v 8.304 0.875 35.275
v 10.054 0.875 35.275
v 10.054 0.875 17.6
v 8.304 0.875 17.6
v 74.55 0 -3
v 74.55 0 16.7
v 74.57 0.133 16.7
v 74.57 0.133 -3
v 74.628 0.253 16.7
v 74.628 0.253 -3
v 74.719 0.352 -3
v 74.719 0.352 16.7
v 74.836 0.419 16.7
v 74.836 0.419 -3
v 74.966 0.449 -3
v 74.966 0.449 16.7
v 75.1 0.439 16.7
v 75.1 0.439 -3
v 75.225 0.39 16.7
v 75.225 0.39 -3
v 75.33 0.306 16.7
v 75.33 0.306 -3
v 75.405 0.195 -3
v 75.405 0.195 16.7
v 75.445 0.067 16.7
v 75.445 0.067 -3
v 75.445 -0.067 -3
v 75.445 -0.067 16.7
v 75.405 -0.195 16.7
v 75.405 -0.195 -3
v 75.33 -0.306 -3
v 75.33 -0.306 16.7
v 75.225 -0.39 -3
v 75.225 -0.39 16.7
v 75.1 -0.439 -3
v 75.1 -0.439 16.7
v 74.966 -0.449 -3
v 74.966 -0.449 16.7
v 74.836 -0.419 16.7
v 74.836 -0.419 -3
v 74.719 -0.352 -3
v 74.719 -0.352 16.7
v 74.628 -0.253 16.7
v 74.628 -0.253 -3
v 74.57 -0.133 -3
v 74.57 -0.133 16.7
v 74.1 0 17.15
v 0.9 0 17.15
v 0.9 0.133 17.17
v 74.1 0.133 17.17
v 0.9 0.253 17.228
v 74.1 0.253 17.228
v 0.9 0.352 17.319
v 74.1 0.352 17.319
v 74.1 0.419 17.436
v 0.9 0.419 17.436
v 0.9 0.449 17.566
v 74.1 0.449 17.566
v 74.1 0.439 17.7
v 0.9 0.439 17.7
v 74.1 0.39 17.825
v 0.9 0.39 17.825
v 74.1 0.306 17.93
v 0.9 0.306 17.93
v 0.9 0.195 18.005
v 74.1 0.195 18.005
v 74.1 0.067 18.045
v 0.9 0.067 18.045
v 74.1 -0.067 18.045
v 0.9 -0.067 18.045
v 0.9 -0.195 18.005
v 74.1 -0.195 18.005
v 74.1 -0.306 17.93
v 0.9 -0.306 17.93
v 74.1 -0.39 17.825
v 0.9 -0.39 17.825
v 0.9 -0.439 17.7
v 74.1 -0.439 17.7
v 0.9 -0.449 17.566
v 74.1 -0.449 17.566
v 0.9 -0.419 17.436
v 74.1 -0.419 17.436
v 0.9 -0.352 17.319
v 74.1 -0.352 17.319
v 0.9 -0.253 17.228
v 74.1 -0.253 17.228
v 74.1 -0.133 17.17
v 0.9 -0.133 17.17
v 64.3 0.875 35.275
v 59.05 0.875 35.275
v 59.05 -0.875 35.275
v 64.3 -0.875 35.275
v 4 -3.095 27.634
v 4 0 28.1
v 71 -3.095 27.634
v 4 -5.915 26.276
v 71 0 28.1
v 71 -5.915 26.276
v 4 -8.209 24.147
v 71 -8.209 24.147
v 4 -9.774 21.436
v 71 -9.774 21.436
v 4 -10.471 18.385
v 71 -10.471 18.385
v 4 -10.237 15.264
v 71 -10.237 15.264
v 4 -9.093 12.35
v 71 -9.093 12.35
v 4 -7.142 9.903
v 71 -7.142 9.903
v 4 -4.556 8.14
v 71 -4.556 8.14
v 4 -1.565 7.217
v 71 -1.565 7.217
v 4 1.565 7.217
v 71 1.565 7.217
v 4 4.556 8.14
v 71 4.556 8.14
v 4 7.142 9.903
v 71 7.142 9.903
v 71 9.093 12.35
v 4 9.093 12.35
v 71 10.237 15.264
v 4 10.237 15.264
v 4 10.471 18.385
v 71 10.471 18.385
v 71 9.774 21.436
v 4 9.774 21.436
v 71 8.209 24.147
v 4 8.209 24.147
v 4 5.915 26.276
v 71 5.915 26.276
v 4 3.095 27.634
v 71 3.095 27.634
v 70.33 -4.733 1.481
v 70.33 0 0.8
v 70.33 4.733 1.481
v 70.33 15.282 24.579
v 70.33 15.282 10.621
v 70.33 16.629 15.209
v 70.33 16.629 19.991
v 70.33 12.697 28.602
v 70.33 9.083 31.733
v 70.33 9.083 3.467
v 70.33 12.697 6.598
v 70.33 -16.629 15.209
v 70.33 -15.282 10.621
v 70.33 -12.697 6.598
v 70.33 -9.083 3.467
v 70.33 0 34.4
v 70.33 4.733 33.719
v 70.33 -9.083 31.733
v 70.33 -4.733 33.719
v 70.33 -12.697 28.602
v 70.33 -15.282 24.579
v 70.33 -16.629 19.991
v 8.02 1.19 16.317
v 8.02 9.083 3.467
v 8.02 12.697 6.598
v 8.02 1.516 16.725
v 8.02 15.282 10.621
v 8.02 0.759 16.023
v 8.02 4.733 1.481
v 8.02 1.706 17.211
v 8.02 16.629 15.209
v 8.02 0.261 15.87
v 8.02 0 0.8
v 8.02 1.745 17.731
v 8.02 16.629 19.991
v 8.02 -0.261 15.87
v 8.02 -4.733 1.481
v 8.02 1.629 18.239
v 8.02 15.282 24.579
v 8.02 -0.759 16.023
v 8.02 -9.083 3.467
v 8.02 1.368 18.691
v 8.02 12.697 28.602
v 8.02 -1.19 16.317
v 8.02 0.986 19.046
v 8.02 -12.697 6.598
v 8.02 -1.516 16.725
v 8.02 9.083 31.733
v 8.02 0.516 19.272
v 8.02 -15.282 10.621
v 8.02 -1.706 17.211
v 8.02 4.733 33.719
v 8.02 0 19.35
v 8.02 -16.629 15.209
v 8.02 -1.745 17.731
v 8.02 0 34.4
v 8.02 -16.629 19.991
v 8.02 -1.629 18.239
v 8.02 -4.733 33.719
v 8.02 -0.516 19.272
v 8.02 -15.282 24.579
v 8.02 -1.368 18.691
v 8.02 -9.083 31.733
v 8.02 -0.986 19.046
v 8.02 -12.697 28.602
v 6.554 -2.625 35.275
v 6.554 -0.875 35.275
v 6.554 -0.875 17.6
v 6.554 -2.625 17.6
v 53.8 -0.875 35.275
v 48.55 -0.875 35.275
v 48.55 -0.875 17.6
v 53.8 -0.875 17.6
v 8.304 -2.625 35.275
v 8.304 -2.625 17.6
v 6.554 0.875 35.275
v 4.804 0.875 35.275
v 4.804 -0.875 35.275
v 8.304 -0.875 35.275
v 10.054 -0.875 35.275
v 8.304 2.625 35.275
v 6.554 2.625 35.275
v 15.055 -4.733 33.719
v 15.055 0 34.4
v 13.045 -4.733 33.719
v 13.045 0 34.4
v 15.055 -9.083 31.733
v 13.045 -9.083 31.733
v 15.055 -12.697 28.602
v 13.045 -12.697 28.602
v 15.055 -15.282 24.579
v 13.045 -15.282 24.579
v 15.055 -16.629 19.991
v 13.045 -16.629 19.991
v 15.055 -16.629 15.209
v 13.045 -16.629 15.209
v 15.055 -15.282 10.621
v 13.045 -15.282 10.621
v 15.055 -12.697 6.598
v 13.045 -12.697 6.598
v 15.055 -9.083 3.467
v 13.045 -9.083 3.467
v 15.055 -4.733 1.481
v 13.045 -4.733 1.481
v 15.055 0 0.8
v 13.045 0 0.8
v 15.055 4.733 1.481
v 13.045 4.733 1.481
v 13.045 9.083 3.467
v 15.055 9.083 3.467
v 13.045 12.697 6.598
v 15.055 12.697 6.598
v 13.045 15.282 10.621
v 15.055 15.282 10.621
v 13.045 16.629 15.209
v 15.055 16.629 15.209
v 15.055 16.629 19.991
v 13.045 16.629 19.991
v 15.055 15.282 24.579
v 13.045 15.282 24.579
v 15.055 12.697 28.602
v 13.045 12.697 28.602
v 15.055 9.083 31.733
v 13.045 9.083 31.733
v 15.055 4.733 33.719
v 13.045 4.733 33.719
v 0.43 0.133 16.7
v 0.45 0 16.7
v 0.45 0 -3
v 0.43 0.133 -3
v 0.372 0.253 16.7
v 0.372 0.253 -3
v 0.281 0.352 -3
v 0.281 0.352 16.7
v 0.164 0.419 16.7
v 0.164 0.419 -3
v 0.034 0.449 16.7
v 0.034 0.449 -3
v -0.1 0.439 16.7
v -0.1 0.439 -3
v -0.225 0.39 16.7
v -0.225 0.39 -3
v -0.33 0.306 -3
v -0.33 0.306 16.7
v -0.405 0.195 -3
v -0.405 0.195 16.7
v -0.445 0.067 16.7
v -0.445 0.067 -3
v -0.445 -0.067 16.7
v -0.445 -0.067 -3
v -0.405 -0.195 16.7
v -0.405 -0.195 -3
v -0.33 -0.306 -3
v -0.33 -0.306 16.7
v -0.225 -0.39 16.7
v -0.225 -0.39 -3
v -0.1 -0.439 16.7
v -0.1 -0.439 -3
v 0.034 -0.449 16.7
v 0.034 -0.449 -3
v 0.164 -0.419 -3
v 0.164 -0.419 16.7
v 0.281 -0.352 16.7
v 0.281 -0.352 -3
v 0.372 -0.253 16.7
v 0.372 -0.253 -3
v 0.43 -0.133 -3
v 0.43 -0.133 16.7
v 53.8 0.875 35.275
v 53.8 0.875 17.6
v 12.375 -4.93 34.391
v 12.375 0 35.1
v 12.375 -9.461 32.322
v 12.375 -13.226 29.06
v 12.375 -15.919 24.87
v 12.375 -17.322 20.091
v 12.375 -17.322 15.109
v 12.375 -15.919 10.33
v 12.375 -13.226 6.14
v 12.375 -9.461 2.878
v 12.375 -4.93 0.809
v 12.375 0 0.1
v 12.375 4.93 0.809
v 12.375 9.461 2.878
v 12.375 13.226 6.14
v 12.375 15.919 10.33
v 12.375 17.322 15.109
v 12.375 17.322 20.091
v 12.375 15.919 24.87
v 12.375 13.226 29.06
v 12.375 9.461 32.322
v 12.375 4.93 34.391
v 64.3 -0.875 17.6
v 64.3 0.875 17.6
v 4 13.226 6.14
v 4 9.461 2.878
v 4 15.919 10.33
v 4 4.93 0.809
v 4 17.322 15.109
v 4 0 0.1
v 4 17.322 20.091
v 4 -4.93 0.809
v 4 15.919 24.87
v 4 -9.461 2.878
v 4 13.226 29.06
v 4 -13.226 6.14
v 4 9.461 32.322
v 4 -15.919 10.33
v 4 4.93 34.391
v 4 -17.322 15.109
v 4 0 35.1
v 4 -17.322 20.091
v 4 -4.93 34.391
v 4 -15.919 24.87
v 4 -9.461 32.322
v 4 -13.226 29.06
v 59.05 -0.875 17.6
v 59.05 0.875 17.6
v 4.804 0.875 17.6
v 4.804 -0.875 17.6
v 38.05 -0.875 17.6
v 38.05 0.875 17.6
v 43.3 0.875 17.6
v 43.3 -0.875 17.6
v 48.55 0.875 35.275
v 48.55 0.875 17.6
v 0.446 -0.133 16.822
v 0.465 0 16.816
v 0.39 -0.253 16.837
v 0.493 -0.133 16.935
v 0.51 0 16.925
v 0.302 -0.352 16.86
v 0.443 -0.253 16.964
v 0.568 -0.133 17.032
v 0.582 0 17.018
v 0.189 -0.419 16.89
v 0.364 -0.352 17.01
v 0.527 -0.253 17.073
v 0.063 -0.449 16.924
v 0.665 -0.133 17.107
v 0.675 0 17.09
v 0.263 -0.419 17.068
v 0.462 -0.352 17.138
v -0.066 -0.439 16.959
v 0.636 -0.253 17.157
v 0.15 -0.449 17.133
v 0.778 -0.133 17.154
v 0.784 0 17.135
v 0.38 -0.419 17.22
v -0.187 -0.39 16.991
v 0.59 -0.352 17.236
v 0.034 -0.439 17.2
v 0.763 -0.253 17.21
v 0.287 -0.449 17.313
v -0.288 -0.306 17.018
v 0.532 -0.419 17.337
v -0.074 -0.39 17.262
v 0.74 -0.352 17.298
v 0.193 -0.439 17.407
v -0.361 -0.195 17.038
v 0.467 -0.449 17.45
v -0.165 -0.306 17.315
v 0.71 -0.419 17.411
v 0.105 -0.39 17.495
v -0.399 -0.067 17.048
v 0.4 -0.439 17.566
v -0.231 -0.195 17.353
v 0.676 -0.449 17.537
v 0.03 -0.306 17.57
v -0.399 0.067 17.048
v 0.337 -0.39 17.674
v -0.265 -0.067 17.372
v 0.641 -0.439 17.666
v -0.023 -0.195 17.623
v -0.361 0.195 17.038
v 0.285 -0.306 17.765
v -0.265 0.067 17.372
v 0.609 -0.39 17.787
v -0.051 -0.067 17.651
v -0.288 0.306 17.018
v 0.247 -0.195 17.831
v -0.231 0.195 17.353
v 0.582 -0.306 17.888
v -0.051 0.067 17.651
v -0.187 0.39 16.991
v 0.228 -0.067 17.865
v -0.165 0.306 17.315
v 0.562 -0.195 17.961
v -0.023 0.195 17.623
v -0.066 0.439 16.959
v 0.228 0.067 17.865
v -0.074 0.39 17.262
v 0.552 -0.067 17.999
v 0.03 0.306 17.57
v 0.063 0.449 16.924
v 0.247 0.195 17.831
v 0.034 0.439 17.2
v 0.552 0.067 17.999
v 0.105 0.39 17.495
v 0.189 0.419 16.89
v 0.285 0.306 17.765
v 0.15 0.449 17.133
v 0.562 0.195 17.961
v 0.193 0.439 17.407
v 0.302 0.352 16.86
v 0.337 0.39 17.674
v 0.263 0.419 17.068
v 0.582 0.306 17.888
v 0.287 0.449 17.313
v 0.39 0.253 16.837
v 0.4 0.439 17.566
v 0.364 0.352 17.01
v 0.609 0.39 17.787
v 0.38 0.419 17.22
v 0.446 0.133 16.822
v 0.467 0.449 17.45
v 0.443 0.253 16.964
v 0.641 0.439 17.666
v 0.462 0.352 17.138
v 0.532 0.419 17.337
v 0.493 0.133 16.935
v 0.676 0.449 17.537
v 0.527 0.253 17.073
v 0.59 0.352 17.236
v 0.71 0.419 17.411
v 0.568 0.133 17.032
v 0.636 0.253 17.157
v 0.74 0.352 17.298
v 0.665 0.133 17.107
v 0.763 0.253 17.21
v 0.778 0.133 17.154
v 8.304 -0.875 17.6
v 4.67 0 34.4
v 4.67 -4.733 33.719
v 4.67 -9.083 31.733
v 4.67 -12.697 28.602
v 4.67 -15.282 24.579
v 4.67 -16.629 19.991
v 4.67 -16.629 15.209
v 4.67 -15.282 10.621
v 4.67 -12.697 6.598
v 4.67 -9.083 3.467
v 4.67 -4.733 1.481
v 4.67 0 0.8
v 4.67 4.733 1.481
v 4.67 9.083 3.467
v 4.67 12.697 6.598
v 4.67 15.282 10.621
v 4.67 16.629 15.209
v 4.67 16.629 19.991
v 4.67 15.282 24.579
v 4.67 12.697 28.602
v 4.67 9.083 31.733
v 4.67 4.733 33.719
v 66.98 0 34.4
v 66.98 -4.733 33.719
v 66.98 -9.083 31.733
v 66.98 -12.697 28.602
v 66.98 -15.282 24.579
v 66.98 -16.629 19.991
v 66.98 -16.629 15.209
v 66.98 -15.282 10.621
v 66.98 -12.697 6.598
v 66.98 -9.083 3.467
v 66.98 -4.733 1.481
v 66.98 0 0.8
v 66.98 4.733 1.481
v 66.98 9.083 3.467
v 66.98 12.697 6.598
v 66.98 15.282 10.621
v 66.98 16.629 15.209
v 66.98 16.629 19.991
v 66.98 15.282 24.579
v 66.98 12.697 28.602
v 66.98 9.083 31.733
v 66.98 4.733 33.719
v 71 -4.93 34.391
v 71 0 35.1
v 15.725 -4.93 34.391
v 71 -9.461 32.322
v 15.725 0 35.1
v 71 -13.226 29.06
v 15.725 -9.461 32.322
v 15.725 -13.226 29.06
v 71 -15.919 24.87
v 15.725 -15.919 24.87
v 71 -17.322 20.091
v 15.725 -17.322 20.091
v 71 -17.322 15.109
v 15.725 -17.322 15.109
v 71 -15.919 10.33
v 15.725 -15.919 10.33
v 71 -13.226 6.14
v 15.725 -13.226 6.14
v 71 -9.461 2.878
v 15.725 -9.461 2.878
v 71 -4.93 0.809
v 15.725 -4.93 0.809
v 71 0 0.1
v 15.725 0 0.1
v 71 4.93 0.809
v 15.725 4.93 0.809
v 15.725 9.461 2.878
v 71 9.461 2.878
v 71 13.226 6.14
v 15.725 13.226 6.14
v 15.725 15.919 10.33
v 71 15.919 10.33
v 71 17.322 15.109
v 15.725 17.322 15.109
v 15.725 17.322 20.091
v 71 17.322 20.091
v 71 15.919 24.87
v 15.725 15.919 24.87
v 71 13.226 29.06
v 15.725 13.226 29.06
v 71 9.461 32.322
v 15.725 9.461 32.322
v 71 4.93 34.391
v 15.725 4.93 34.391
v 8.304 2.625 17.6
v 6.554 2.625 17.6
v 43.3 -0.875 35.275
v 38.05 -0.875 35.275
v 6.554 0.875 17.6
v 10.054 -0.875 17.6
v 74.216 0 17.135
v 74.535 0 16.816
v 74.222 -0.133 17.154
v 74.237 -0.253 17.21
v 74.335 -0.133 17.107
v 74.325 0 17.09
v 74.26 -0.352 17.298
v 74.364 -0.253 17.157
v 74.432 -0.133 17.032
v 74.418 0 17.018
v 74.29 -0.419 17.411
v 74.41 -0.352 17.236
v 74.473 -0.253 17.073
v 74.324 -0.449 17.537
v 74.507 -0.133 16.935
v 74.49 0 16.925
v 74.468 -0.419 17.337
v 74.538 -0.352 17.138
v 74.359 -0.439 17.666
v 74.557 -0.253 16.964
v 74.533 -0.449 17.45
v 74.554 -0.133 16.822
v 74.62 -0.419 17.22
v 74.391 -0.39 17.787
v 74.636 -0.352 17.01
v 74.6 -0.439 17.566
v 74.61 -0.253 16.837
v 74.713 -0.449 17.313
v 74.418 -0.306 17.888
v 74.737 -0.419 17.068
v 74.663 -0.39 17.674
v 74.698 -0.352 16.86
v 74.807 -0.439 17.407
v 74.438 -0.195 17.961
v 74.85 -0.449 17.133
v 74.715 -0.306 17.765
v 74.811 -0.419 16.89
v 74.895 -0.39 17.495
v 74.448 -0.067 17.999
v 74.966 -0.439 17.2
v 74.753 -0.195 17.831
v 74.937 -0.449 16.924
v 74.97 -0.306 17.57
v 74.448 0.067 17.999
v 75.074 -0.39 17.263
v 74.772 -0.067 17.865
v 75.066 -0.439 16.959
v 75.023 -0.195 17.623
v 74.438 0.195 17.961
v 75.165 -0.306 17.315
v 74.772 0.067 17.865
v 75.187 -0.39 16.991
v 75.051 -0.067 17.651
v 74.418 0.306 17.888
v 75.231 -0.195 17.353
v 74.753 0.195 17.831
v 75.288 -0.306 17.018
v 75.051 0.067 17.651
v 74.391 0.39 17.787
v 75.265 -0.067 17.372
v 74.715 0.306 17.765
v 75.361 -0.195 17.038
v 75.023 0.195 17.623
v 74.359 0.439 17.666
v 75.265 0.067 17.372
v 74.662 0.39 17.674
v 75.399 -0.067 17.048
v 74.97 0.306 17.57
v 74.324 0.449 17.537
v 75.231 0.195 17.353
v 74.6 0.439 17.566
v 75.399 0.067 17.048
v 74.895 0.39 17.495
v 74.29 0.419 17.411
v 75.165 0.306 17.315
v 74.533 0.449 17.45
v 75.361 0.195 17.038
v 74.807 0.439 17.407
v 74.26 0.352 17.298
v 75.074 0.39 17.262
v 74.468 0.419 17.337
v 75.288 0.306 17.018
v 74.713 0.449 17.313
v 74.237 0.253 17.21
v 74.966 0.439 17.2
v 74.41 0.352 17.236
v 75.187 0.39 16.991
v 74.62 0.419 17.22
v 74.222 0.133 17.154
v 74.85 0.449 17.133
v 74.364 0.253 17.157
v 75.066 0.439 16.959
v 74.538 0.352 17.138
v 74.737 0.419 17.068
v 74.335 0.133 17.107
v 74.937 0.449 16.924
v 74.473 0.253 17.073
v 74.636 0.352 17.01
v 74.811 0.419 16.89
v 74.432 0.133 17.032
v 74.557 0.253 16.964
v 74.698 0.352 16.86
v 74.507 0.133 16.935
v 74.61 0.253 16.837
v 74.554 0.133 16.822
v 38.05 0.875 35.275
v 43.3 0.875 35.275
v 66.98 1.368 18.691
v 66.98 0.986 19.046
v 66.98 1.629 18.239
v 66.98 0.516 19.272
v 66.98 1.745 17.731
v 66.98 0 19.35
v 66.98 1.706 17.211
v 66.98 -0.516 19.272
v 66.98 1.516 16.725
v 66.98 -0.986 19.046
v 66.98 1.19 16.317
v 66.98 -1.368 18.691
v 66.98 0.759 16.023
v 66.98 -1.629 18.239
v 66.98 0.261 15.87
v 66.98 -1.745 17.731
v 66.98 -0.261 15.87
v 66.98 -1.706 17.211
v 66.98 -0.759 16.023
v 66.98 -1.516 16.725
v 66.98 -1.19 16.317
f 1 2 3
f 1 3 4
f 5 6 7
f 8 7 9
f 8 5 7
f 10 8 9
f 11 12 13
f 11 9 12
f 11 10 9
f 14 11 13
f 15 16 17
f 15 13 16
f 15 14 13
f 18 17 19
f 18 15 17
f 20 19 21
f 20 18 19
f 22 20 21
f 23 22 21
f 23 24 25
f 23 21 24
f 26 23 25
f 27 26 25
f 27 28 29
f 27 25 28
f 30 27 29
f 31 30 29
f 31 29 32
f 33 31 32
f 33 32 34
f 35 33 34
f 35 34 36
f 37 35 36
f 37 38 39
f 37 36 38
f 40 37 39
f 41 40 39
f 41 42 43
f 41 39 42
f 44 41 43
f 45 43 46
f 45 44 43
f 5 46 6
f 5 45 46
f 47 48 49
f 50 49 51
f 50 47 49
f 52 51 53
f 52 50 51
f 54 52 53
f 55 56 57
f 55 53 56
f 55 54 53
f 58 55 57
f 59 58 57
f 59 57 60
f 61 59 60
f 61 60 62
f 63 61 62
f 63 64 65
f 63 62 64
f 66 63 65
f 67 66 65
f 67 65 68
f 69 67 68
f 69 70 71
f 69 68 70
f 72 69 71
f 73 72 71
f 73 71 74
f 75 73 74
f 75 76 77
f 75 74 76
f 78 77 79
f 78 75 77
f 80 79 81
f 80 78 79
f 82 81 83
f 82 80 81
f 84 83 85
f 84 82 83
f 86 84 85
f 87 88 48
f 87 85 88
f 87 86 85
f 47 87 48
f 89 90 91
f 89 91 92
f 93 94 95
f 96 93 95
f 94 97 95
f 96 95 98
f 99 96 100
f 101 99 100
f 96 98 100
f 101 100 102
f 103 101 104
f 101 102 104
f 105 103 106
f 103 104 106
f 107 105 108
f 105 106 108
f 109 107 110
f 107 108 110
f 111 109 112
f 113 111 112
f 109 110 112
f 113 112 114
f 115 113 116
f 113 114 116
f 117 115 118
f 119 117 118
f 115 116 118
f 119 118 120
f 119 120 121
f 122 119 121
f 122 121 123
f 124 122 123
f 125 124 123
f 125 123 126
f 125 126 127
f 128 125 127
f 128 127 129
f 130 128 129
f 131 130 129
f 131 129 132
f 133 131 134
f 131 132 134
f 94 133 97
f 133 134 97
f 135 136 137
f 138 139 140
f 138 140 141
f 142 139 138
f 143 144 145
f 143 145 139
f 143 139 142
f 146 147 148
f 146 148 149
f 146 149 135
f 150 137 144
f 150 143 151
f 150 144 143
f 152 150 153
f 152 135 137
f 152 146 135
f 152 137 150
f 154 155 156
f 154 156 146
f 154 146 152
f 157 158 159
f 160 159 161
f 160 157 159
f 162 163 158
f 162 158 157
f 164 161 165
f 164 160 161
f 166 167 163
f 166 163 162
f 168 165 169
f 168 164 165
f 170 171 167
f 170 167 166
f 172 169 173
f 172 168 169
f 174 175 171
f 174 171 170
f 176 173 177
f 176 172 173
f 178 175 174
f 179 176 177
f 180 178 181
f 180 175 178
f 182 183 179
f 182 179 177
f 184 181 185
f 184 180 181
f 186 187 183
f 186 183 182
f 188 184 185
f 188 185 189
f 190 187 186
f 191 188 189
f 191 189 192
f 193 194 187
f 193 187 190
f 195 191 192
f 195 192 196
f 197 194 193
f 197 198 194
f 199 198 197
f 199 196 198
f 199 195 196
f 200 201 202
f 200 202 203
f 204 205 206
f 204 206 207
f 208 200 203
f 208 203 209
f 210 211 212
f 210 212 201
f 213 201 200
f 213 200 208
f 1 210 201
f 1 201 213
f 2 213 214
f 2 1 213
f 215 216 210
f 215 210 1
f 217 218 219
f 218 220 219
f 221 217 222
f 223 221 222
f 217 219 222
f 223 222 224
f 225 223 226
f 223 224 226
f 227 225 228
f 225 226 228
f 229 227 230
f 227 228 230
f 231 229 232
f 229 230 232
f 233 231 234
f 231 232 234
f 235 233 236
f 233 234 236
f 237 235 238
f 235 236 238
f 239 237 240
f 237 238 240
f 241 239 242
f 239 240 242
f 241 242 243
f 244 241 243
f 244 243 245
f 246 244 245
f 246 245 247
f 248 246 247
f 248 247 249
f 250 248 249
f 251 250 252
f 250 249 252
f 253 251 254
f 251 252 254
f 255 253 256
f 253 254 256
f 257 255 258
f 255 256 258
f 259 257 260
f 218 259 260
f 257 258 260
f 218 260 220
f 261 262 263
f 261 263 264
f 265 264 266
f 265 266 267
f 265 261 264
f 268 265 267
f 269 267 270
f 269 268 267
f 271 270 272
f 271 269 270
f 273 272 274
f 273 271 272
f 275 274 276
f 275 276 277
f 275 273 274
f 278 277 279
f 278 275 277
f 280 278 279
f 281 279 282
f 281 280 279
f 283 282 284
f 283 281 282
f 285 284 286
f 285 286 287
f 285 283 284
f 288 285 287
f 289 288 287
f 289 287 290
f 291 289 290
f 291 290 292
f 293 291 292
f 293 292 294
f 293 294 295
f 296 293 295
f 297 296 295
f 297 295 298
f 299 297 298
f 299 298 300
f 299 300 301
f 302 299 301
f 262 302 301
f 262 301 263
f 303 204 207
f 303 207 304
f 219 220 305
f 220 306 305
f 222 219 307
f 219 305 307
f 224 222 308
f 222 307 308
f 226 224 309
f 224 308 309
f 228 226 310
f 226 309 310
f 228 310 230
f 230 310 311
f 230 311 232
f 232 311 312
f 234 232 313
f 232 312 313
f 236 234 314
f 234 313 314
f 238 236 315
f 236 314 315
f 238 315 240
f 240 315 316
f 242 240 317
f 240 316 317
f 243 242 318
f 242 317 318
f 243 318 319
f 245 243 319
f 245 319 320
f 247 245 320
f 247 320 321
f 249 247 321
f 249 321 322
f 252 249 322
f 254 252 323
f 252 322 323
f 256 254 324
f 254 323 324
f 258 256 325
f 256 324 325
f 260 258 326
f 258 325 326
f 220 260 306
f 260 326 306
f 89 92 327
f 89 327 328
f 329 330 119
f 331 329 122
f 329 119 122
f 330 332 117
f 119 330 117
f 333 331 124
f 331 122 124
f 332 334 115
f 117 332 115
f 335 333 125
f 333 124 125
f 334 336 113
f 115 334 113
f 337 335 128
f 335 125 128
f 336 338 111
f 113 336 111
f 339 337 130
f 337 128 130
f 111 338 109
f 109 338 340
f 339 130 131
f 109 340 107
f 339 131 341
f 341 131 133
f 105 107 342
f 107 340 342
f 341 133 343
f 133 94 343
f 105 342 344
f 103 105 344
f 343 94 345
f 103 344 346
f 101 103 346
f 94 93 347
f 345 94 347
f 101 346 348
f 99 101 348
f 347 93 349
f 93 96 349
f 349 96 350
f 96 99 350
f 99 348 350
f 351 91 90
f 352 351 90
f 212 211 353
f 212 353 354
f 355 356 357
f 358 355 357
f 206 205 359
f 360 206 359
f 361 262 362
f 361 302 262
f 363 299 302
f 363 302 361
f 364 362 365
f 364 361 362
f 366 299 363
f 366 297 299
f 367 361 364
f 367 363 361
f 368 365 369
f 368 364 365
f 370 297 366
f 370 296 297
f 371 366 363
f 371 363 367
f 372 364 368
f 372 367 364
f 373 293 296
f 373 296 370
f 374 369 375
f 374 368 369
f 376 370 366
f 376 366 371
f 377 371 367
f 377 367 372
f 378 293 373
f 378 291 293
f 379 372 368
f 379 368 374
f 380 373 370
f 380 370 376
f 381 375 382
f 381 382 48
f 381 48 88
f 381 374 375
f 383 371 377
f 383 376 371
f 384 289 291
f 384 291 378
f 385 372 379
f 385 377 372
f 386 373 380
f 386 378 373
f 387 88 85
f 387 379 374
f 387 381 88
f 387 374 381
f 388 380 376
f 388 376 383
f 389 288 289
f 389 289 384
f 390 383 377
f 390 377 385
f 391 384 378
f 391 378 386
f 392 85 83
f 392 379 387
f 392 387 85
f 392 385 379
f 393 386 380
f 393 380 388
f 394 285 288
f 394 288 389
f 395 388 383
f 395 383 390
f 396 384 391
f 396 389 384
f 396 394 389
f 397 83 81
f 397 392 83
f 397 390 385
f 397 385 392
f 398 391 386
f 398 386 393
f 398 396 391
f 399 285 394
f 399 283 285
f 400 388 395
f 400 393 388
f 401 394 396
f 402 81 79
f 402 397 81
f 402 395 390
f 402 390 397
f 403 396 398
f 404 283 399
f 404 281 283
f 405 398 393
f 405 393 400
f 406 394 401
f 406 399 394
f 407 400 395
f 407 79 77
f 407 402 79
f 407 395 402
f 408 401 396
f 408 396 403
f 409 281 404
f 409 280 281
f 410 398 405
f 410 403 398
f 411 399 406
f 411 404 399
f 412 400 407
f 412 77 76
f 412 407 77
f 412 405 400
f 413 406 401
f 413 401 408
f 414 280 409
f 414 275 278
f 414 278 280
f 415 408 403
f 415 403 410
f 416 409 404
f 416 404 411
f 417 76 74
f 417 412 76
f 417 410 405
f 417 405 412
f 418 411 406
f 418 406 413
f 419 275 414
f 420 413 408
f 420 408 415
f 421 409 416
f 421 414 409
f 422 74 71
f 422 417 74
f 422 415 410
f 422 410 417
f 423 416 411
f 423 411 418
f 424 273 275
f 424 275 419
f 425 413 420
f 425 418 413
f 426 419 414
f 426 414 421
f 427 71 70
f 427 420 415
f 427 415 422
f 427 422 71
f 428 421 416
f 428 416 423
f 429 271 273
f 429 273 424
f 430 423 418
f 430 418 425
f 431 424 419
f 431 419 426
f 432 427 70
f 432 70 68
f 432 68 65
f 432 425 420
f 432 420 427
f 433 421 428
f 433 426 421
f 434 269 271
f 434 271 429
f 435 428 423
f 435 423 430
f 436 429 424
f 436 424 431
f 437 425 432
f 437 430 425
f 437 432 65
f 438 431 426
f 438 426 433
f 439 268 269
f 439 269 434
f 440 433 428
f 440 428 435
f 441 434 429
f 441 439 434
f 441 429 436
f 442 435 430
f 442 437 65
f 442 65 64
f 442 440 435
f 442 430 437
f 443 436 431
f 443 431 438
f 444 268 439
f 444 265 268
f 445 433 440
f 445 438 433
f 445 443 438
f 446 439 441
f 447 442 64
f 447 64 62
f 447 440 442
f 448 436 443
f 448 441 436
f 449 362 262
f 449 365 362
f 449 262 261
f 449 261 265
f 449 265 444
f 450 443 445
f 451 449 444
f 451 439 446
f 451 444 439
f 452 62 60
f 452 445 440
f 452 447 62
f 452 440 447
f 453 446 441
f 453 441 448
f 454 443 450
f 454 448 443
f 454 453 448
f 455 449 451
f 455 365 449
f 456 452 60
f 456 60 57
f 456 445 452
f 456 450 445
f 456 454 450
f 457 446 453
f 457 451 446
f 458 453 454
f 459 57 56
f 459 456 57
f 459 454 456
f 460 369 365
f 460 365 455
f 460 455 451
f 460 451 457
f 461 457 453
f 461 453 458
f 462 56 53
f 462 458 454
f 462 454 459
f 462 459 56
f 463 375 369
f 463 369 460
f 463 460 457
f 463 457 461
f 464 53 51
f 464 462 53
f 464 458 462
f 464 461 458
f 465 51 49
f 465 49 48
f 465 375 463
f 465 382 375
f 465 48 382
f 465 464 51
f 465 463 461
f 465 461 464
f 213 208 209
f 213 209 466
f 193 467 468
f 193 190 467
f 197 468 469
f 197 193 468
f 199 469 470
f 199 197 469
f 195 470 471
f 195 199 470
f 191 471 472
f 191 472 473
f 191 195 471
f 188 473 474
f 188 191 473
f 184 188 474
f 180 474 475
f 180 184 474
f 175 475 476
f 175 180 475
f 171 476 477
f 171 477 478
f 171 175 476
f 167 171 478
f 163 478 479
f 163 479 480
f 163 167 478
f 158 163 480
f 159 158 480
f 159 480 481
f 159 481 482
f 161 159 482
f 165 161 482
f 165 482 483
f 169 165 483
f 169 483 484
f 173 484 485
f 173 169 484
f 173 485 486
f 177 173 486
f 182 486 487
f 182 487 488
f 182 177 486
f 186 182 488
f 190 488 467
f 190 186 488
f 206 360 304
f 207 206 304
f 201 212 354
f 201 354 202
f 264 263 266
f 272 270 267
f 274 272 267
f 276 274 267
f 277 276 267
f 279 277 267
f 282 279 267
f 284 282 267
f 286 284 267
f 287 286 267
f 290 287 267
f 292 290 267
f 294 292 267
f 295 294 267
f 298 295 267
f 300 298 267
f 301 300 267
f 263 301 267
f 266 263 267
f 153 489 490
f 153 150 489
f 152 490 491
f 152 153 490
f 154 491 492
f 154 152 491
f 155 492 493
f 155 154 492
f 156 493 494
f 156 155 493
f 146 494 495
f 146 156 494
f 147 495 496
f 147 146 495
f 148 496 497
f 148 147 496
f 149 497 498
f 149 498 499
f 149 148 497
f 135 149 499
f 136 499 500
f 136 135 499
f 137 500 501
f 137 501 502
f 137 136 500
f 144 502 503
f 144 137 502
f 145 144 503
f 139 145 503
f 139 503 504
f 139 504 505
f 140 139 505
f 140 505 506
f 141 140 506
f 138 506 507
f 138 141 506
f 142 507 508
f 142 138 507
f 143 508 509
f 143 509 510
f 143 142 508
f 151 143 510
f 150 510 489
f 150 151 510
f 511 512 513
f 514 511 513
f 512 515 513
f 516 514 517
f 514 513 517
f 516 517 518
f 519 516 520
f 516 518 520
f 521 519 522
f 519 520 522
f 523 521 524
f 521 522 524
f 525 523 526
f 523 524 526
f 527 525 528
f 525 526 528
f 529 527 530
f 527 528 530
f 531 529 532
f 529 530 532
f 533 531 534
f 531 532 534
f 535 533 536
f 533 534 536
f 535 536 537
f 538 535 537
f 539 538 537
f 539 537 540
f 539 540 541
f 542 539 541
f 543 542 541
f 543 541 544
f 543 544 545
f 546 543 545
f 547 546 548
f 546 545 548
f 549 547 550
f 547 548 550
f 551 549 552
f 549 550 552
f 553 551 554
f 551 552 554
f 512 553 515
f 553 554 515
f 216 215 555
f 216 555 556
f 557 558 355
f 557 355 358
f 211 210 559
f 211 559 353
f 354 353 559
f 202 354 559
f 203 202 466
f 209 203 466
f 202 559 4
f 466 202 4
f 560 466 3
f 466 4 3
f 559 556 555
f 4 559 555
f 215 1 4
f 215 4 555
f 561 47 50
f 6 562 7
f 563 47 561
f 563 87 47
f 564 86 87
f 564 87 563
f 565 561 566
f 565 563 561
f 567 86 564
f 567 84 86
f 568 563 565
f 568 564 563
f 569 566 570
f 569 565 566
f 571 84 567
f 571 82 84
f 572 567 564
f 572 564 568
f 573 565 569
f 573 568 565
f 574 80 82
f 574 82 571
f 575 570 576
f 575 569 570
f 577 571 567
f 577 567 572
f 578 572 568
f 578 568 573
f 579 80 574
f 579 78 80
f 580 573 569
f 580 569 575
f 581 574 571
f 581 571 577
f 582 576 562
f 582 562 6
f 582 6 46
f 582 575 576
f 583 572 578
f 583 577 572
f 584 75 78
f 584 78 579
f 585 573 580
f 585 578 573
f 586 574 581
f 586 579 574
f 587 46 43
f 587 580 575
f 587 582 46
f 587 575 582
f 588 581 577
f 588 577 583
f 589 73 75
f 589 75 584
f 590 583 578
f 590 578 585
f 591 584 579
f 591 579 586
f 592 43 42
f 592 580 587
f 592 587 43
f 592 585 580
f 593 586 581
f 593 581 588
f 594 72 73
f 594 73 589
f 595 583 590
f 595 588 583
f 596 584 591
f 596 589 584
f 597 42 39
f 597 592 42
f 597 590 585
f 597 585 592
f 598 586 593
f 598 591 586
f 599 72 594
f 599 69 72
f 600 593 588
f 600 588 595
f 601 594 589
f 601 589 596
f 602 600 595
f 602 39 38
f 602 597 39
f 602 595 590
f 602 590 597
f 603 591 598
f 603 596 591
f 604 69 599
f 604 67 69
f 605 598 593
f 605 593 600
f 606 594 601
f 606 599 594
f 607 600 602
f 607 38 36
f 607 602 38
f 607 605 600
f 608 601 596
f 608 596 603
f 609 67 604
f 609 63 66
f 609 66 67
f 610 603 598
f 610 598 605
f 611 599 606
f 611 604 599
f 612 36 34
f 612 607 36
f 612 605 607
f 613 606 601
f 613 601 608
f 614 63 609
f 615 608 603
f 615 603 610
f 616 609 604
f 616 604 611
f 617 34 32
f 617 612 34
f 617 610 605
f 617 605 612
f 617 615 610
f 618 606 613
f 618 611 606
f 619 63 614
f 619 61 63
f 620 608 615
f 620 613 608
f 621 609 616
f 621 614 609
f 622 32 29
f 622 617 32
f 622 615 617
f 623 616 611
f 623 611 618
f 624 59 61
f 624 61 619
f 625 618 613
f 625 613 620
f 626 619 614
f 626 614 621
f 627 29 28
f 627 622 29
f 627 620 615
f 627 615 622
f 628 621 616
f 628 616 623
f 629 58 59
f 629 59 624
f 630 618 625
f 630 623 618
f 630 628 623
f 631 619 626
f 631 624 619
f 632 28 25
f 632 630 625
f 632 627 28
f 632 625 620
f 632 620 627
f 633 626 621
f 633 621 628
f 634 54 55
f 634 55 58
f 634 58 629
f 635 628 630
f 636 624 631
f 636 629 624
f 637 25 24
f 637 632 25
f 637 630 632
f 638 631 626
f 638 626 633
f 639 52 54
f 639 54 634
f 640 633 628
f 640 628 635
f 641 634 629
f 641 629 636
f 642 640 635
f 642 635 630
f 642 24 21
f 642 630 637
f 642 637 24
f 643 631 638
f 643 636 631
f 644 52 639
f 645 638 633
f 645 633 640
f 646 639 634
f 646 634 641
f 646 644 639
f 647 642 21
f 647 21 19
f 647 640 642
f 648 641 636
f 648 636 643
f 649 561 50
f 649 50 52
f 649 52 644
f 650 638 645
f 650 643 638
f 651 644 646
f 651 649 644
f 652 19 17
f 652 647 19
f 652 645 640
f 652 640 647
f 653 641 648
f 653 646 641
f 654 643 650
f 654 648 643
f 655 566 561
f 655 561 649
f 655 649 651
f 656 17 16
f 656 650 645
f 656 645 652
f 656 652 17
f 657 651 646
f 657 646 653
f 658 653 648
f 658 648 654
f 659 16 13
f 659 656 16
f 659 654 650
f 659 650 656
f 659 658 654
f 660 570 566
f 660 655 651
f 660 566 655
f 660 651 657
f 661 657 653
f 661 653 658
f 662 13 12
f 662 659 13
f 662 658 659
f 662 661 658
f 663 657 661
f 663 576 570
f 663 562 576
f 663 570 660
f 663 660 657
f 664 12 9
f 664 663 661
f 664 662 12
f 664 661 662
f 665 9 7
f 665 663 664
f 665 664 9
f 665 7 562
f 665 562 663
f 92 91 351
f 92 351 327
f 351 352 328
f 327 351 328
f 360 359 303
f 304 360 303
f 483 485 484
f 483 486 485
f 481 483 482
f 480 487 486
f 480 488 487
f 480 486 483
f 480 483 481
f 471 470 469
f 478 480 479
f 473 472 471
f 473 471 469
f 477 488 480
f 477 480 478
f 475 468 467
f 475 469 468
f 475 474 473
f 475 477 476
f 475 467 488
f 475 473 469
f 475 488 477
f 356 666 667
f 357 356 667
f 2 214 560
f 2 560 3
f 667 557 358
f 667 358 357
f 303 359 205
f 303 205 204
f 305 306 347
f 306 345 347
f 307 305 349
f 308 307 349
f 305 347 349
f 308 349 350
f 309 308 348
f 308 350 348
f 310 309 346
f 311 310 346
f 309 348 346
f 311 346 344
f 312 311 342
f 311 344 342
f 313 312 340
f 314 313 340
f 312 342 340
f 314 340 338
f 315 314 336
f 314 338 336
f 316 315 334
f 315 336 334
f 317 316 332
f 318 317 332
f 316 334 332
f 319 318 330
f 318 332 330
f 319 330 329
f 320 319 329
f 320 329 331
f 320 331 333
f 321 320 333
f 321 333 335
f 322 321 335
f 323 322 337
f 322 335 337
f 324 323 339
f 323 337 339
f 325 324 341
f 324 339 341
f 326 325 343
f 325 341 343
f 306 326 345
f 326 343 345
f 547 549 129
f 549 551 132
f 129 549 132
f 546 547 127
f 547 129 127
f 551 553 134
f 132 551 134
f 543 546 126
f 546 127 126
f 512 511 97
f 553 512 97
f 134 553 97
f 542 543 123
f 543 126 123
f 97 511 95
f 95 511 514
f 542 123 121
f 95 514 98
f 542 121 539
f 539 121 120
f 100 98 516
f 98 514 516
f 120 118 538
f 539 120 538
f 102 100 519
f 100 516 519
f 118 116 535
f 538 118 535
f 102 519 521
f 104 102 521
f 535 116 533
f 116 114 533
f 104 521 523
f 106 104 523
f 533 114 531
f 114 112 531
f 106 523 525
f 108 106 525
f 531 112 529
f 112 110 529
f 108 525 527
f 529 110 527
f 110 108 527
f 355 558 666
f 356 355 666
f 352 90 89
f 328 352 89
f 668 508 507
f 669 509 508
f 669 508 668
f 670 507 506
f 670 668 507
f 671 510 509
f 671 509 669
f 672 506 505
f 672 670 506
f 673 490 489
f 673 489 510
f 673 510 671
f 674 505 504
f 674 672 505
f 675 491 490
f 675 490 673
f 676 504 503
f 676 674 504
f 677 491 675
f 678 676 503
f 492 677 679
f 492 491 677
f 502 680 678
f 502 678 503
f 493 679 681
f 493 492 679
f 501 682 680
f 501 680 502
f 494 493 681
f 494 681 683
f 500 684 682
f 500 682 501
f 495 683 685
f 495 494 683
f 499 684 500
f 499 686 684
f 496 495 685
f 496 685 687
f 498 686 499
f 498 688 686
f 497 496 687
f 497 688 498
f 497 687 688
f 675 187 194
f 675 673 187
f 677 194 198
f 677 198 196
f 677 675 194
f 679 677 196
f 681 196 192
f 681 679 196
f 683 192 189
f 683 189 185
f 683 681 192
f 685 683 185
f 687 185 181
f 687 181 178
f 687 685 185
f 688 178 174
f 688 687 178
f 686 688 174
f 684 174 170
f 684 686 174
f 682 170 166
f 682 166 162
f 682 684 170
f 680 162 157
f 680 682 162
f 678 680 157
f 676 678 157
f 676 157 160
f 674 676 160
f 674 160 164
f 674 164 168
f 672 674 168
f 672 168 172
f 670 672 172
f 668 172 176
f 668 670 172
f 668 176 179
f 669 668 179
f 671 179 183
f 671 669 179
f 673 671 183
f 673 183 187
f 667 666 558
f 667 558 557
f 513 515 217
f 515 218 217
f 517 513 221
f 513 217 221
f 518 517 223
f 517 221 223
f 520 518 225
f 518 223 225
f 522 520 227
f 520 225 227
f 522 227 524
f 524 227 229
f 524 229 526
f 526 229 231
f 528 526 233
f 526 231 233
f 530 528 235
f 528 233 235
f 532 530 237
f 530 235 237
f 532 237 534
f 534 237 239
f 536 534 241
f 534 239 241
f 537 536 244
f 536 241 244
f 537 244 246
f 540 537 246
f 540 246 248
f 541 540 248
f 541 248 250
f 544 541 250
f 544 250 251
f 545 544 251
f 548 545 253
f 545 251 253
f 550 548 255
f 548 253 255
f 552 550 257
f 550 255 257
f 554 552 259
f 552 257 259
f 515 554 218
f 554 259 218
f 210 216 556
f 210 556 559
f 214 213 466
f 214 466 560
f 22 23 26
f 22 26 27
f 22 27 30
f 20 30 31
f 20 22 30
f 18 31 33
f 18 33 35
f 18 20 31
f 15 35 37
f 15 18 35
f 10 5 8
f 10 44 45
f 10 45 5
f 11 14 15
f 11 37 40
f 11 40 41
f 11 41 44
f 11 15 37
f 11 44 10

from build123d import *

# Parameters (mm, degrees)
SKETCH_R    = 0.45
SKETCH004_W = 5.25
SKETCH004_H = 1.75
PAD_DEPTH   = 17.675


with BuildPart() as sweep_body:
    # Sweep: sweep along a path in Sketch001
    with BuildLine(Plane.XZ) as sweep_path:
        Line((0, -3), (0, 16.7))
        ThreePointArc((0, 16.7), (0.263601, 17.336393), (0.899993, 17.6))
        Line((0.899993, 17.6), (74.1, 17.6))
        ThreePointArc((74.1, 17.6), (74.736396, 17.336396), (75, 16.7))
        Line((75, 16.7), (75, -3))
    # Sketch → Sweep (sweep)
    with BuildSketch(Plane.XY.offset(-2)):
        Circle(SKETCH_R)
    sweep(path=sweep_path.line)


with BuildPart() as revolution:
    # Sketch002 → Revolution (revolve)
    with BuildSketch(Plane.XZ):
        Polygon((4, 35.1), (4, 28.1), (71, 28.1), (71, 35.1), (15.725, 35.1), (15.055, 34.4), (13.045, 34.4), (12.375, 35.1), align=None)
    revolve(axis=Axis((6.97588, 0, 17.6), (1, 0, 0)))


with BuildPart() as revolution001:
    # Sketch003 → Revolution001 (revolve)
    with BuildSketch(Plane.XZ):
        Polygon((4.67, 34.4), (8.02, 34.4), (8.02, 19.35), (66.98, 19.35), (66.98, 34.4), (70.33, 34.4), (70.33, 17.6), (4.67, 17.6), align=None)
    revolve(axis=Axis((6.97588, 0, 17.6), (1, 0, 0)))


with BuildPart() as pad:
    # Sketch004 → Pad (new body)
    with BuildSketch(Plane.XY.offset(17.6)):
        with Locations((61.675, 0)):
            Rectangle(SKETCH004_W, SKETCH004_H)
        with Locations((51.175, 0)):
            Rectangle(SKETCH004_W, SKETCH004_H)
        with Locations((40.675, 0)):
            Rectangle(SKETCH004_W, SKETCH004_H)
        Polygon((6.554, 0.875), (4.804, 0.875), (4.804, -0.875), (6.554, -0.875), (6.554, -2.625), (8.304, -2.625), (8.304, -0.875), (10.054, -0.875), (10.054, 0.875), (8.304, 0.875), (8.304, 2.625), (6.554, 2.625), align=None)
    extrude(amount=PAD_DEPTH)


solid = Compound([sweep_body.part, revolution.part, revolution001.part, pad.part])
